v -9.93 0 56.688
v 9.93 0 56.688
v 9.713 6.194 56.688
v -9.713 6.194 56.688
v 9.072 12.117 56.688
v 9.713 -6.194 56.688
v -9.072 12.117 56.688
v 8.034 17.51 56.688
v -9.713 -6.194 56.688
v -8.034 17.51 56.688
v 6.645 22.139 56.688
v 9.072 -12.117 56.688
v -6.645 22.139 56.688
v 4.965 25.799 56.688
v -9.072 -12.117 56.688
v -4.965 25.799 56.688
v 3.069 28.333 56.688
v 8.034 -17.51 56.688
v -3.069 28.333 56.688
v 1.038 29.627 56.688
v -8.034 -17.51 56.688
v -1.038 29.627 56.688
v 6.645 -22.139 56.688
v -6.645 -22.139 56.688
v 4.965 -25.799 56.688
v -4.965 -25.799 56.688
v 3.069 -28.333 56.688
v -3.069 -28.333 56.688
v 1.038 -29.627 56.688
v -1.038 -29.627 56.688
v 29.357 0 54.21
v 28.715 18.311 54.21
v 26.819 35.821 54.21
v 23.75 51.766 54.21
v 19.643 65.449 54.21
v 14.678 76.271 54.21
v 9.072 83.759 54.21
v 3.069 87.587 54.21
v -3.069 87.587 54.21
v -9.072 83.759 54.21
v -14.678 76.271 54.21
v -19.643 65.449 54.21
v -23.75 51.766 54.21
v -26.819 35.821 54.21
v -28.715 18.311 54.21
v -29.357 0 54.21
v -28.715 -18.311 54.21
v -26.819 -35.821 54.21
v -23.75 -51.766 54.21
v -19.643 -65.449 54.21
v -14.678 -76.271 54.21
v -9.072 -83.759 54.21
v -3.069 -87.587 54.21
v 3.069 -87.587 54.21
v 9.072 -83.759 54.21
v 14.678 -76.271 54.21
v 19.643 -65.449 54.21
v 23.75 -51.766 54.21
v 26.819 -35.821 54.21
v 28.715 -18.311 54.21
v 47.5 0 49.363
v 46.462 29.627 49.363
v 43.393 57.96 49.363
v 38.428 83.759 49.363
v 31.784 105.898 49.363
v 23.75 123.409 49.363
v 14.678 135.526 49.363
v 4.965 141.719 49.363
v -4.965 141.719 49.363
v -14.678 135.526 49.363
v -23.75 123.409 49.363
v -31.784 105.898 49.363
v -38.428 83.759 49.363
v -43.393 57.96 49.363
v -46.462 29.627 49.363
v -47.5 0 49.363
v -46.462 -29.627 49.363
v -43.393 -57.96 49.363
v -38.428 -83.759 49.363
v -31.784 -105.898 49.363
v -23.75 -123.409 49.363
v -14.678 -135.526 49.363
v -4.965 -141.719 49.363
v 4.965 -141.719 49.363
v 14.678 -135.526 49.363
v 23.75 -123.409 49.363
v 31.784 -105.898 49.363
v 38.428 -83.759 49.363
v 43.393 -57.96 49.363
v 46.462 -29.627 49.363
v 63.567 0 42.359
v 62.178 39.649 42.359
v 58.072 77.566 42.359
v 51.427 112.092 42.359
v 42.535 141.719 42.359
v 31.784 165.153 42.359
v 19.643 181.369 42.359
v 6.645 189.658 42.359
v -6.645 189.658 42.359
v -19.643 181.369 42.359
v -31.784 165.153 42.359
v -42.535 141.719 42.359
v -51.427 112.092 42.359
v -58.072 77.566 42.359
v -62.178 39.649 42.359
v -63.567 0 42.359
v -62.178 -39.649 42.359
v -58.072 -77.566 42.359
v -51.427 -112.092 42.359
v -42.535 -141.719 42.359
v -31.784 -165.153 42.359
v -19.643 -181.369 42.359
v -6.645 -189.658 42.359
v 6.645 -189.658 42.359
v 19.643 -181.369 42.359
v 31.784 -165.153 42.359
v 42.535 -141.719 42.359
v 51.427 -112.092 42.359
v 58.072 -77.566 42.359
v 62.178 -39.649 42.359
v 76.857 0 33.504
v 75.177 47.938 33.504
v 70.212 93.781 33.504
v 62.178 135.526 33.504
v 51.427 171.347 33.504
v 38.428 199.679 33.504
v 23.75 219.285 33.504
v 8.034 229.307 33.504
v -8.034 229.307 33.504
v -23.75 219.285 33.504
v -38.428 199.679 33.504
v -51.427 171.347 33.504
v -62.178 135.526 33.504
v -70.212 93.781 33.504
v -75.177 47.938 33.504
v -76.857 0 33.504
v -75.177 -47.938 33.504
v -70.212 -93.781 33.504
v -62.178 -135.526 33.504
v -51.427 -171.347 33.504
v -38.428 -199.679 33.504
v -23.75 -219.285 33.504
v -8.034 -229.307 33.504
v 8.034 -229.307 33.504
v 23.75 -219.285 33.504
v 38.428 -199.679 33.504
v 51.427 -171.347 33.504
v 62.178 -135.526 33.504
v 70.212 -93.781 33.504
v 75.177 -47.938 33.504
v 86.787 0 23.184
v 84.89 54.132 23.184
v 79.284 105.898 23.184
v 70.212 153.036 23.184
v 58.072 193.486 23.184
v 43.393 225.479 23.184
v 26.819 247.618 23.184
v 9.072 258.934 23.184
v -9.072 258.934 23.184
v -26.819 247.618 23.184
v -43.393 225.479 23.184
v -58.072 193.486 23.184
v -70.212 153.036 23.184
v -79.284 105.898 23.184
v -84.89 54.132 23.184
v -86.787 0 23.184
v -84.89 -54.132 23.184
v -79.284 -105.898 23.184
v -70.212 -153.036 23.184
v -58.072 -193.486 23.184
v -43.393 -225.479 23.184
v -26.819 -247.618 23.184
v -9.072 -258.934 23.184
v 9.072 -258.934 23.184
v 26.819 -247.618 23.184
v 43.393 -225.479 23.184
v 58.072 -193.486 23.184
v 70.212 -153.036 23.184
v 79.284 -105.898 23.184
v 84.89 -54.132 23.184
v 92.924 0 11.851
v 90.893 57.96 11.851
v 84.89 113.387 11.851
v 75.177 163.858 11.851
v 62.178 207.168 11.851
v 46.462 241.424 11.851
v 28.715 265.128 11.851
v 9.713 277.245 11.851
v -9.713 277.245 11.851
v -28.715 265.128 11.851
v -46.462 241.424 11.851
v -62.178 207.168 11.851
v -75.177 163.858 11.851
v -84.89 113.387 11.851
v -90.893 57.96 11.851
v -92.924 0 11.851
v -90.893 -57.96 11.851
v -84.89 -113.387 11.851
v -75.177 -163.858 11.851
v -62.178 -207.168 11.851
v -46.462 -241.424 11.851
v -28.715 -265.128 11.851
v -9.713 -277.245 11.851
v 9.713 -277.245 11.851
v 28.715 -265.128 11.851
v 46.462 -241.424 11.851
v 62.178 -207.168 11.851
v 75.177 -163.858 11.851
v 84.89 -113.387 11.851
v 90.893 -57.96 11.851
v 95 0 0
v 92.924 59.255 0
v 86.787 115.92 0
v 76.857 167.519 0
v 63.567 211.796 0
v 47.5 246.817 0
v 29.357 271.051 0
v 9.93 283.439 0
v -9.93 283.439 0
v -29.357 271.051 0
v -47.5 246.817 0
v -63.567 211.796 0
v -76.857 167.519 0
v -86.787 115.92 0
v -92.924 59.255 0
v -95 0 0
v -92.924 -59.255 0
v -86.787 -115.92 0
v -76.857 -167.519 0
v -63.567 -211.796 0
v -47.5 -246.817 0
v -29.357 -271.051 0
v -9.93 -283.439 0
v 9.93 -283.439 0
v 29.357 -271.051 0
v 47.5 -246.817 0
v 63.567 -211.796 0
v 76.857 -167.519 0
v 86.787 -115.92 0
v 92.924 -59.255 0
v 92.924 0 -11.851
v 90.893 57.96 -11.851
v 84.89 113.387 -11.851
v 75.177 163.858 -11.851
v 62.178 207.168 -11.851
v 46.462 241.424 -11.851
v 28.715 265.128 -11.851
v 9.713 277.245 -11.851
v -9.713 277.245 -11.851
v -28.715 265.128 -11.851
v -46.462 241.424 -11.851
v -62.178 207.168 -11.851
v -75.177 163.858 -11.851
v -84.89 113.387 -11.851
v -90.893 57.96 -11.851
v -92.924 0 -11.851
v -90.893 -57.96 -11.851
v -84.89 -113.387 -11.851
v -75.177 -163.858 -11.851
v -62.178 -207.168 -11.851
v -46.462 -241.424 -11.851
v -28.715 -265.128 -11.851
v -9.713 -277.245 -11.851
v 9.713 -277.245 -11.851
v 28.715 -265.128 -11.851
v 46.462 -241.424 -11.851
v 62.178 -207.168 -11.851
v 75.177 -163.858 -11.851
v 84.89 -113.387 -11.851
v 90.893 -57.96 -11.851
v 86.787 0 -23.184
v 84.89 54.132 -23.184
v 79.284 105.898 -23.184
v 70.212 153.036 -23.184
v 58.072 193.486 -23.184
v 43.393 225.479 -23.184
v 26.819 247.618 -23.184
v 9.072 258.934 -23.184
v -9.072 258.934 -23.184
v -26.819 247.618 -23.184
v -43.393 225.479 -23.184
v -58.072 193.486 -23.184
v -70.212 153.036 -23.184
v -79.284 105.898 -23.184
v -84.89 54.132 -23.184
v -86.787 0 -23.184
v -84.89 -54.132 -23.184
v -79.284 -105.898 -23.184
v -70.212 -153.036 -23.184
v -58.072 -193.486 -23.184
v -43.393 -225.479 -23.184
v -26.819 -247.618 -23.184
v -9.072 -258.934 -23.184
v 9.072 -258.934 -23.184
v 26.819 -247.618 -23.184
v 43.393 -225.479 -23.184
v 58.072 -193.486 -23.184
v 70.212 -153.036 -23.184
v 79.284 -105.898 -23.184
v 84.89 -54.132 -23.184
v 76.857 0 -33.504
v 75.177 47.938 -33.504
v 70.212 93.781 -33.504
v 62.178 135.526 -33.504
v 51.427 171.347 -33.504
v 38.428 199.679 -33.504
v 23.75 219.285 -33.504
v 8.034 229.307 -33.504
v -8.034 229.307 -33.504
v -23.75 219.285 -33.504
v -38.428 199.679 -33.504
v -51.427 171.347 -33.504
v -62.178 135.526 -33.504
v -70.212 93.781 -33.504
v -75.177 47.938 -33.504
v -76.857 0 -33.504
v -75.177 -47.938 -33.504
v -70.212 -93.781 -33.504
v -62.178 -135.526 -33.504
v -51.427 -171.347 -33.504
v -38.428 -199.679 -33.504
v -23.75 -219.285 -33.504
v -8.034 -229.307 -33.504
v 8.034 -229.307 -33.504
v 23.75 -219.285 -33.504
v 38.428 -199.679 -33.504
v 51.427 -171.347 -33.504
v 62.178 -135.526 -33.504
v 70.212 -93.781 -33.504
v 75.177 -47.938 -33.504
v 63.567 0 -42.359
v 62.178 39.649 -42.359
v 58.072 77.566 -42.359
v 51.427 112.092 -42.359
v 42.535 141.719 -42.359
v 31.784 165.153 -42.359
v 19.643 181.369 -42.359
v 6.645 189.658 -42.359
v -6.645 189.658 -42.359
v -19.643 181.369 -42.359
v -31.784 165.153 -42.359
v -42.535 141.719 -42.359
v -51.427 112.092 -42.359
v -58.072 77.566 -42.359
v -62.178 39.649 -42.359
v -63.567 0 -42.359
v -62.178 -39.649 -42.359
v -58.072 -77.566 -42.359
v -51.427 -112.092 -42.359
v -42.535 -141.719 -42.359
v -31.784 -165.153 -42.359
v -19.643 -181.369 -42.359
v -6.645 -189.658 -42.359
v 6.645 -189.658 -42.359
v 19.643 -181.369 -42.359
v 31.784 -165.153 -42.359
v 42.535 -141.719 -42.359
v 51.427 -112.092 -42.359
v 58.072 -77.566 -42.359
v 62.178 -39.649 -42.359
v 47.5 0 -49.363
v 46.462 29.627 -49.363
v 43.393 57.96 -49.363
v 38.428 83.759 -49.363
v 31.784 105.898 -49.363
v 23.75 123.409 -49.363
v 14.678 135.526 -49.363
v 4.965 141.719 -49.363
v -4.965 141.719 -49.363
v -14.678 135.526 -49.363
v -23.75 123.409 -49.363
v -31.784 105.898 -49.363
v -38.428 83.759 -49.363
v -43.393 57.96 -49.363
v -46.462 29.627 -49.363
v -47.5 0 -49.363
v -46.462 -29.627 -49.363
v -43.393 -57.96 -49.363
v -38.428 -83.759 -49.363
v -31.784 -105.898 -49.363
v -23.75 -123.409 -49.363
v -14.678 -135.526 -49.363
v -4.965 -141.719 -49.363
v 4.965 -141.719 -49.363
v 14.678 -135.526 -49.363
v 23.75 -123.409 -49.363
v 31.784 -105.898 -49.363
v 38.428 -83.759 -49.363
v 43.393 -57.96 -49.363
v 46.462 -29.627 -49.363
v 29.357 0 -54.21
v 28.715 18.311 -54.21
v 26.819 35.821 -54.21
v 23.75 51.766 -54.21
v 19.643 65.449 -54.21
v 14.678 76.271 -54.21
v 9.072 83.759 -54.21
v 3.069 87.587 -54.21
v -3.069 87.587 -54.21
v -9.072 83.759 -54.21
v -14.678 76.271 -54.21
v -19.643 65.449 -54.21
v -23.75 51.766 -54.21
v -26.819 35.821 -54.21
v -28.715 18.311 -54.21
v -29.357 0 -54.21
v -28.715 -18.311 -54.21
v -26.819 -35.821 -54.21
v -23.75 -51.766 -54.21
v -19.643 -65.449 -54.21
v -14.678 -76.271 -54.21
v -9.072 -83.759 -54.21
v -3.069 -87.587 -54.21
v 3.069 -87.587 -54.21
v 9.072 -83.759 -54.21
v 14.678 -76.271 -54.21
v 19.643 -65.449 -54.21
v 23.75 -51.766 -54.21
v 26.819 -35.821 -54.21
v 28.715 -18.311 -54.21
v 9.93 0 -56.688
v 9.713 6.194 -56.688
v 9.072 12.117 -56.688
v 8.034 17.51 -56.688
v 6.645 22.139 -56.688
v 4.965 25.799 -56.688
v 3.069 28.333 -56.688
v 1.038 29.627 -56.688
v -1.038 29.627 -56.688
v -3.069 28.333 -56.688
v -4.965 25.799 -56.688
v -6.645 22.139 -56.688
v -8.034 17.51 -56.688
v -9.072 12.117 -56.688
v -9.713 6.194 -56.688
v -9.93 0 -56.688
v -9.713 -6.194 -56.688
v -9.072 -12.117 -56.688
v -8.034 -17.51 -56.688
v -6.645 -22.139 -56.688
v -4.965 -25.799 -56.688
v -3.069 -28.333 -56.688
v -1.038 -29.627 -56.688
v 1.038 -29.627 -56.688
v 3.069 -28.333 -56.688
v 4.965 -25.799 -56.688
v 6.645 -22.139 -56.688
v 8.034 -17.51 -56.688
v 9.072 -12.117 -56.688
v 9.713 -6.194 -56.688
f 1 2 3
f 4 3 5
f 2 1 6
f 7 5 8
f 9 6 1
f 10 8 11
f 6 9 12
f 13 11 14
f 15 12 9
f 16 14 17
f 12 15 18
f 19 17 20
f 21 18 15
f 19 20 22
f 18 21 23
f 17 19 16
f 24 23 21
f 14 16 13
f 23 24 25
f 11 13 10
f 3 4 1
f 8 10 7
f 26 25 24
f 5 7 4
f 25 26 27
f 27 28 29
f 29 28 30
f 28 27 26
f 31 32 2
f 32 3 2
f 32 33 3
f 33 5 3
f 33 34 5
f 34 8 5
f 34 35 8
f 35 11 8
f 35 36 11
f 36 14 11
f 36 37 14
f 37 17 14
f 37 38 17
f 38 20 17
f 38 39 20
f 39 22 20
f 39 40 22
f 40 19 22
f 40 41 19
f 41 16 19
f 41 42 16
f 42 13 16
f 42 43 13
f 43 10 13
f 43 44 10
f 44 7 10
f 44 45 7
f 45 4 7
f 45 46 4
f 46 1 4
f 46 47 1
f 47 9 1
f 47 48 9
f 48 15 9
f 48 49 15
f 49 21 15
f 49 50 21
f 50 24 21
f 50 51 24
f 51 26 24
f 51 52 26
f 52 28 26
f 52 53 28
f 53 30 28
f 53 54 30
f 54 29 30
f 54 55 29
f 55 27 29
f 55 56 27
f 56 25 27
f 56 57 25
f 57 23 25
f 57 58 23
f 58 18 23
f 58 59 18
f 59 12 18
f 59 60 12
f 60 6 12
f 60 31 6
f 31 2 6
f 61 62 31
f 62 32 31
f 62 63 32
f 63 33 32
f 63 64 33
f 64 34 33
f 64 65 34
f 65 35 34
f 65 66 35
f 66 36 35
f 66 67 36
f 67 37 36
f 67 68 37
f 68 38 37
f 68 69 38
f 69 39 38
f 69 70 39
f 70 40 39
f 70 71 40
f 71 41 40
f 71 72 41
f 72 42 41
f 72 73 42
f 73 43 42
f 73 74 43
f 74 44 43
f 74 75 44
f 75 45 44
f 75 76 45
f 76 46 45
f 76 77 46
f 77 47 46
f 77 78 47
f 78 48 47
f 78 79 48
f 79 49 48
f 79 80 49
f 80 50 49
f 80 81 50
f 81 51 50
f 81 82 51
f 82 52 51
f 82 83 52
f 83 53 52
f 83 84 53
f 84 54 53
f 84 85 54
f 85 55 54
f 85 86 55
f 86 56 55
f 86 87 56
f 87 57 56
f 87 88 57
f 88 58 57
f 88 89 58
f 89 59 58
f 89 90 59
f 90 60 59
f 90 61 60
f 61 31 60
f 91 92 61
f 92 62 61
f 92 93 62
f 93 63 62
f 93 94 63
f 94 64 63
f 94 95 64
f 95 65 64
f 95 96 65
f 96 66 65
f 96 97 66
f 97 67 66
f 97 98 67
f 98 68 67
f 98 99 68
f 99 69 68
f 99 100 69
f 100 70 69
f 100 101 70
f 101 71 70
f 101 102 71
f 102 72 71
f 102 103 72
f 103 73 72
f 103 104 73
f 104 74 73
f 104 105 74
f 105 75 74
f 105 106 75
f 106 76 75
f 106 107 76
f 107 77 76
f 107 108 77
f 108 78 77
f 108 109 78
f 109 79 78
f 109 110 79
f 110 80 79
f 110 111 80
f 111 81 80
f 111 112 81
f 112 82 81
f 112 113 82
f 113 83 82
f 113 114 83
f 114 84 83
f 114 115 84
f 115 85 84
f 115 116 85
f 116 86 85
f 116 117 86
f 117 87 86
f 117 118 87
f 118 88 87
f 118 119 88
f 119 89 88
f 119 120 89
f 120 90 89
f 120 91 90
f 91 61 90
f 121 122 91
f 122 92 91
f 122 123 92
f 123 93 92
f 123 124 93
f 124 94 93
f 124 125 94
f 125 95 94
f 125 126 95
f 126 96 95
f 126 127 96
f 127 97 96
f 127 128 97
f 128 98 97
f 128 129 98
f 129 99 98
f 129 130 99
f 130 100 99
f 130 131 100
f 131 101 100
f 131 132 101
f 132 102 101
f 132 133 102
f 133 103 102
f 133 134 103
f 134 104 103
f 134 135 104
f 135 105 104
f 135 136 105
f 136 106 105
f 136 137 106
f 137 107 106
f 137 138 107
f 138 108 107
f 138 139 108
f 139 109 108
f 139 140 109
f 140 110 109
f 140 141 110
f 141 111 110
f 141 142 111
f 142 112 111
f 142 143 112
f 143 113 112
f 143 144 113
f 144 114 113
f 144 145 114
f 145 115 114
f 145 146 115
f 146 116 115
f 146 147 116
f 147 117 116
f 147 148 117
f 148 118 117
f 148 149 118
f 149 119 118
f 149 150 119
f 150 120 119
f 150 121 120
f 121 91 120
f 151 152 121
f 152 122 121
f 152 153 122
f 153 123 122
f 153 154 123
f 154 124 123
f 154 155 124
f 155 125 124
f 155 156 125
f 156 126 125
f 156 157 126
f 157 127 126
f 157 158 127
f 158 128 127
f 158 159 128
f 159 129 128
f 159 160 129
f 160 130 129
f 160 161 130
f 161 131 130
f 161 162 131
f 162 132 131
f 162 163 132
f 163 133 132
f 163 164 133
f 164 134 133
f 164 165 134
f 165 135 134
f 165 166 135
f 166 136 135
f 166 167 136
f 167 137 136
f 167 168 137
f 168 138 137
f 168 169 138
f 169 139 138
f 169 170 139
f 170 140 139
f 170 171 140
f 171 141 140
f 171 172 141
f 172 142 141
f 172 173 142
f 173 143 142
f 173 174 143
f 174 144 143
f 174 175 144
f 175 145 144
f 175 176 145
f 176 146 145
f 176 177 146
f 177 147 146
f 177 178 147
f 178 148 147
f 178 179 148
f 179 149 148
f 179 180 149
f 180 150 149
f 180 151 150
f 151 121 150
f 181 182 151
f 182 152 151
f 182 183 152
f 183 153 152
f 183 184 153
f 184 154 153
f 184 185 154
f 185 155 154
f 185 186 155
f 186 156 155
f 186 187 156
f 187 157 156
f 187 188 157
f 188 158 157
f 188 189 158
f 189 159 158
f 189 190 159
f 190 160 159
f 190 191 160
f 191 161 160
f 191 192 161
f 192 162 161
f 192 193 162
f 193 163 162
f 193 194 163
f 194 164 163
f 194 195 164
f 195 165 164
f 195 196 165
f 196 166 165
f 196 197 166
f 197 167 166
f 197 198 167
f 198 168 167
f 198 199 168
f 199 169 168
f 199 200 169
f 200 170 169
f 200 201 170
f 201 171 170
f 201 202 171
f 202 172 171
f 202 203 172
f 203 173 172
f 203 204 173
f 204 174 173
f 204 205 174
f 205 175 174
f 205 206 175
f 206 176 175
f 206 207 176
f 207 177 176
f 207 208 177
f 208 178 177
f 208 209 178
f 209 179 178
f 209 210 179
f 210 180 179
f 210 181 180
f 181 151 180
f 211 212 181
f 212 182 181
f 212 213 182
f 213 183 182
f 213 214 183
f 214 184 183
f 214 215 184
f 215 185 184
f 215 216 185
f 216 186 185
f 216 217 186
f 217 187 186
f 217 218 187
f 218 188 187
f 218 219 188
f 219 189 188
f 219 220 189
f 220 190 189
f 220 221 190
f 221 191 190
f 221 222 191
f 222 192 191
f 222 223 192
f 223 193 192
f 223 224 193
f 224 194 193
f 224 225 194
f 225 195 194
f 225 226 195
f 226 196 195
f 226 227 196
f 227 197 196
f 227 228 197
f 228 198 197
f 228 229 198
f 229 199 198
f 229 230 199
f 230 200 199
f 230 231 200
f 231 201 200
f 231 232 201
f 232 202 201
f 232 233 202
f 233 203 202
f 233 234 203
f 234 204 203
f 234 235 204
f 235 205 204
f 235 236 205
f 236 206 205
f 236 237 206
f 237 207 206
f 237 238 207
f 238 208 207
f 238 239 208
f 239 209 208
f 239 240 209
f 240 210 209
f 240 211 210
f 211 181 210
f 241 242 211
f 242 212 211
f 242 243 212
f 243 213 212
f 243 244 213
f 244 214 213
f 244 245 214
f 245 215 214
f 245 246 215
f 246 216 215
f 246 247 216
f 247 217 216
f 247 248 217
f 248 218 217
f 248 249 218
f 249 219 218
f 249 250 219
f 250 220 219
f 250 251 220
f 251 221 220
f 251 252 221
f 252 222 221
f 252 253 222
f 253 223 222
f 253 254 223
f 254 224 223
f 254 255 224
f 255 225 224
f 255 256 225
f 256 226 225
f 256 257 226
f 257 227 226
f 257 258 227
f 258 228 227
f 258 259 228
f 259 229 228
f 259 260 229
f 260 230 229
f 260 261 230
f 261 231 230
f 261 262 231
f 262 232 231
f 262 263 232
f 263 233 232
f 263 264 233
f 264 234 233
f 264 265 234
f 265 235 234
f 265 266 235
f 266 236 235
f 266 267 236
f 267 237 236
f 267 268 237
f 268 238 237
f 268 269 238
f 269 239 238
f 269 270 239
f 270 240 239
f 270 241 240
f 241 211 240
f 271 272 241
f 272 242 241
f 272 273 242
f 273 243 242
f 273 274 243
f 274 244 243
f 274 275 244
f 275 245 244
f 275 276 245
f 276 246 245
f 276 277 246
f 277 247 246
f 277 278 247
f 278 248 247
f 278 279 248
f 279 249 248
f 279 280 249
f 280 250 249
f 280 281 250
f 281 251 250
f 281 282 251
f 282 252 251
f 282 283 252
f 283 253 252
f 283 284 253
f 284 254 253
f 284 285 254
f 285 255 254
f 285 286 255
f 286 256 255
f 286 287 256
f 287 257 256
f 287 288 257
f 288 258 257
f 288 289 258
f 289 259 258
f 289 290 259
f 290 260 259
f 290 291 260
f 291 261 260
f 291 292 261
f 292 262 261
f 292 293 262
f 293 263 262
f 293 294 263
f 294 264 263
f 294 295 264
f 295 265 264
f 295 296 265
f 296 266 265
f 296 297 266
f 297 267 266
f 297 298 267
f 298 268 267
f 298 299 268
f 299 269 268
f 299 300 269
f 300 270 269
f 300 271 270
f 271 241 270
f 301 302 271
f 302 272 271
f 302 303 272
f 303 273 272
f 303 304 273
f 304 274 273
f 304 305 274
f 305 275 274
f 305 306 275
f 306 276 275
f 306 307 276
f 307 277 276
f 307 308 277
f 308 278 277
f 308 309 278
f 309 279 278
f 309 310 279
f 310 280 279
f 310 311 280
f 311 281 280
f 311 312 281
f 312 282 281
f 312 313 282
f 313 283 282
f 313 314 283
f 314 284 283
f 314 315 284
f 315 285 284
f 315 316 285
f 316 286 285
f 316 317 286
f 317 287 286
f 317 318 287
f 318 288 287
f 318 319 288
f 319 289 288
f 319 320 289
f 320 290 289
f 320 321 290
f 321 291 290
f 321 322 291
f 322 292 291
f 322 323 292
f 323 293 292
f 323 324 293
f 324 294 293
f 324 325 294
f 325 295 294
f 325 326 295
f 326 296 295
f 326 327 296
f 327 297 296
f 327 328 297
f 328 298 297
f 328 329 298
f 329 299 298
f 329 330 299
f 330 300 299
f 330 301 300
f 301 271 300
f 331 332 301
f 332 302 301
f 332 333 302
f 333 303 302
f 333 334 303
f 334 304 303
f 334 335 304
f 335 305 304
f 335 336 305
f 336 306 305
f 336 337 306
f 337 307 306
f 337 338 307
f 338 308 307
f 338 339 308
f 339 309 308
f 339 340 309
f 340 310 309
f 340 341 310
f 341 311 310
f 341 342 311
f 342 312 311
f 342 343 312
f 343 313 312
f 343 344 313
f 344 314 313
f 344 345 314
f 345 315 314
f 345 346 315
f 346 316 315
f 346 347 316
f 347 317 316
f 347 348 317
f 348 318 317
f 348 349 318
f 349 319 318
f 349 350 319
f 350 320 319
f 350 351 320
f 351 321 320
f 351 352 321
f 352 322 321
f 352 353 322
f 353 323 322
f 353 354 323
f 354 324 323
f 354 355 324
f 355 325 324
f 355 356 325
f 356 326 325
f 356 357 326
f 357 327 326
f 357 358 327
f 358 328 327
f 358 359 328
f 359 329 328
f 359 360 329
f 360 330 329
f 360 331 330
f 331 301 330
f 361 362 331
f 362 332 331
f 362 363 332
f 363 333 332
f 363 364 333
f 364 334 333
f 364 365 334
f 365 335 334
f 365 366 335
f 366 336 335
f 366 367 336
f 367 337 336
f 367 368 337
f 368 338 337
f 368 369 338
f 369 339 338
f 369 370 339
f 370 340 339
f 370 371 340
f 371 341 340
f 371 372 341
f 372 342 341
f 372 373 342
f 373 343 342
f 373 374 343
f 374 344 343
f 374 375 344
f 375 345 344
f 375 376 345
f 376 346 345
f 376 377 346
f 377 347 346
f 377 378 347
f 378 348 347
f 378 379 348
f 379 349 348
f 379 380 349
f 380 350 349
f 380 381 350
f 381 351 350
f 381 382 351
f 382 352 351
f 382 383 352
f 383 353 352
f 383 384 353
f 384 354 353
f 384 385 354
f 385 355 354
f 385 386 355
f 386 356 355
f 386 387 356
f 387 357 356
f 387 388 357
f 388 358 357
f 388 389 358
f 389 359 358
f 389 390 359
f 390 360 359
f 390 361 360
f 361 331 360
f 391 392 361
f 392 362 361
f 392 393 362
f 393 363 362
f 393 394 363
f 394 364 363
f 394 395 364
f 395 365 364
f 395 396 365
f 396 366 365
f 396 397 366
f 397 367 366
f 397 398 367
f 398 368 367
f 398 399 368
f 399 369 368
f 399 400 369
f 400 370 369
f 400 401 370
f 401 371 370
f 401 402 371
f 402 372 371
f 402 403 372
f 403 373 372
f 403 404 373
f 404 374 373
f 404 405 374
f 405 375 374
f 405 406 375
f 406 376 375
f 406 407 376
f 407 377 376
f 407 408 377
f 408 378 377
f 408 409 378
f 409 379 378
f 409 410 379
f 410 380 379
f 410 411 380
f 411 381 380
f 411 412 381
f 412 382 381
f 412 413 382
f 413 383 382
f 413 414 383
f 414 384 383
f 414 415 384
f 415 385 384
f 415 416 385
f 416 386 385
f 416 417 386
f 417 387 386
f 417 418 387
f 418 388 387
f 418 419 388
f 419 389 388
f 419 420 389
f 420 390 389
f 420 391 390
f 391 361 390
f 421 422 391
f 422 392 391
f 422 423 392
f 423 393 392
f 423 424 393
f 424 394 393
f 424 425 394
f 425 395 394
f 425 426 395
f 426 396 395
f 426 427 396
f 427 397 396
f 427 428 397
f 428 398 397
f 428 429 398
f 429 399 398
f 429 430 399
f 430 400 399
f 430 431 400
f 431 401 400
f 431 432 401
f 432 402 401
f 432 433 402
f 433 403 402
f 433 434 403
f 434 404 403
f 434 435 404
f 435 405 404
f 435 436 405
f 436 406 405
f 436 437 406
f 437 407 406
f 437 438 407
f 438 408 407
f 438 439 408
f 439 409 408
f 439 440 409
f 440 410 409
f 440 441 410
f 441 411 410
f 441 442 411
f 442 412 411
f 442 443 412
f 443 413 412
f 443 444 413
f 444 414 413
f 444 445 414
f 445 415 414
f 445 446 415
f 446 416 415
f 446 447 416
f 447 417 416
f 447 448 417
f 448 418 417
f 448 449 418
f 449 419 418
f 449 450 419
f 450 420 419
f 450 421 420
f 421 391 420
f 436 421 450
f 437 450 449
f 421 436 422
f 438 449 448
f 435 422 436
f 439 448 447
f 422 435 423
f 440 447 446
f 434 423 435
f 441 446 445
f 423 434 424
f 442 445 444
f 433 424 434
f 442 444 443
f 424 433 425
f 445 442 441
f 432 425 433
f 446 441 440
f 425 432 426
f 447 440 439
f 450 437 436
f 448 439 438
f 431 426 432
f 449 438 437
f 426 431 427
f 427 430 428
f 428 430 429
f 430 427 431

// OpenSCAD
// Generated by SolidPython 1.0.1 on 2020-07-29 00:46:46


scale(v = [5, 15, 3]) {
	sphere(r = 19);
}
/***********************************************
*********      SolidPython code:      **********
************************************************
 
# import packages: SolidPython
from solid import *
from solid.utils import *
from itertools import chain, combinations, permutations


class Resize:

    def __init__(self, scad_file):
        self.scad_file = scad_file
        #self.scad_file = import_scad(scad_file)
        # cone/cylinder param:
        self.r1 = 0
        self.r2 = 0
        self.h = 0
        # rectangular prism param:
        self.w = 0
        self.l = 0
        # ellipse param:
        self.r = 0

    # import OpenScad code (file name corresponds to shape)


    # classify shape + parameters
    def assign(self, param1, param2, param3):
        if self.scad_file == 'cone.scad':
            self.r1 = param1
            self.r2 = param2
            self.h = param3
        elif self.scad_file == 'cylinder.scad':
            self.r1 = param1
            self.r2 = param2
            self.h = param3
        elif self.scad_file == 'rectangularPrism.scad':
            self.h = param1
            self.l = param2
            self.w = param3
        else:
            self.r = param1
            self.h = param2

    # resize parameters
    def iterate(self):
        x = range(3, 20, 2)
        i = 1
        if self.scad_file == 'cone.scad':
            tempList = list(permutations(x, 2))
            for temp in tempList:
                param1 = temp[0]
                param2 = temp[1]
                filepath = 'produced_scad_files/' + 'cone' + str(param1) + '_' + str(param2) + '_' + '.scad'
                scad_render_to_file(cylinder(h=param1, r1=param2, r2=0), filepath)

        elif self.scad_file == 'cylinder.scad':
            tempList = list(permutations(x, 3))
            for temp in tempList:
                param1 = temp[0]
                param2 = temp[1]
                filepath = 'produced_scad_files/' + 'cylinder' + str(param1) + '_' + str(param2) + '_' + '.scad'
                scad_render_to_file(cylinder(h=param1, r1=param2, r2=param2), filepath)

        elif self.scad_file == 'rectangularPrism.scad':
            tempList = list(permutations(x, 3))
            for temp in tempList:
                param1 = temp[0]
                param2 = temp[1]
                param3 = temp[2]
                filepath = 'produced_scad_files/' + 'rectangularPrism' + str(param1) + '_' + str(param2) + '_' + str(
                    param3) + '.scad'
                scad_render_to_file(cube(size=(param1, param2, param3)), filepath)

        elif self.scad_file == 'ellipse.scad':
            tempList = list(permutations(x, 4))
            for temp in tempList:
                param1 = temp[0]
                param2 = temp[1]
                param3 = temp[2]
                param4 = temp[3]
                filepath = 'produced_scad_files/' + 'ellipse' + str(param1) + '_' + str(param2) + '_' + str(param3) + '_' + str(param4) + '.scad'
                scad_render_to_file(scale([param1, param2, param3])(sphere(r=param4)), filepath)

    def render_to_scadfile(self):
        scad_render_to_file(scad, 'example.scad') 
 
************************************************/
